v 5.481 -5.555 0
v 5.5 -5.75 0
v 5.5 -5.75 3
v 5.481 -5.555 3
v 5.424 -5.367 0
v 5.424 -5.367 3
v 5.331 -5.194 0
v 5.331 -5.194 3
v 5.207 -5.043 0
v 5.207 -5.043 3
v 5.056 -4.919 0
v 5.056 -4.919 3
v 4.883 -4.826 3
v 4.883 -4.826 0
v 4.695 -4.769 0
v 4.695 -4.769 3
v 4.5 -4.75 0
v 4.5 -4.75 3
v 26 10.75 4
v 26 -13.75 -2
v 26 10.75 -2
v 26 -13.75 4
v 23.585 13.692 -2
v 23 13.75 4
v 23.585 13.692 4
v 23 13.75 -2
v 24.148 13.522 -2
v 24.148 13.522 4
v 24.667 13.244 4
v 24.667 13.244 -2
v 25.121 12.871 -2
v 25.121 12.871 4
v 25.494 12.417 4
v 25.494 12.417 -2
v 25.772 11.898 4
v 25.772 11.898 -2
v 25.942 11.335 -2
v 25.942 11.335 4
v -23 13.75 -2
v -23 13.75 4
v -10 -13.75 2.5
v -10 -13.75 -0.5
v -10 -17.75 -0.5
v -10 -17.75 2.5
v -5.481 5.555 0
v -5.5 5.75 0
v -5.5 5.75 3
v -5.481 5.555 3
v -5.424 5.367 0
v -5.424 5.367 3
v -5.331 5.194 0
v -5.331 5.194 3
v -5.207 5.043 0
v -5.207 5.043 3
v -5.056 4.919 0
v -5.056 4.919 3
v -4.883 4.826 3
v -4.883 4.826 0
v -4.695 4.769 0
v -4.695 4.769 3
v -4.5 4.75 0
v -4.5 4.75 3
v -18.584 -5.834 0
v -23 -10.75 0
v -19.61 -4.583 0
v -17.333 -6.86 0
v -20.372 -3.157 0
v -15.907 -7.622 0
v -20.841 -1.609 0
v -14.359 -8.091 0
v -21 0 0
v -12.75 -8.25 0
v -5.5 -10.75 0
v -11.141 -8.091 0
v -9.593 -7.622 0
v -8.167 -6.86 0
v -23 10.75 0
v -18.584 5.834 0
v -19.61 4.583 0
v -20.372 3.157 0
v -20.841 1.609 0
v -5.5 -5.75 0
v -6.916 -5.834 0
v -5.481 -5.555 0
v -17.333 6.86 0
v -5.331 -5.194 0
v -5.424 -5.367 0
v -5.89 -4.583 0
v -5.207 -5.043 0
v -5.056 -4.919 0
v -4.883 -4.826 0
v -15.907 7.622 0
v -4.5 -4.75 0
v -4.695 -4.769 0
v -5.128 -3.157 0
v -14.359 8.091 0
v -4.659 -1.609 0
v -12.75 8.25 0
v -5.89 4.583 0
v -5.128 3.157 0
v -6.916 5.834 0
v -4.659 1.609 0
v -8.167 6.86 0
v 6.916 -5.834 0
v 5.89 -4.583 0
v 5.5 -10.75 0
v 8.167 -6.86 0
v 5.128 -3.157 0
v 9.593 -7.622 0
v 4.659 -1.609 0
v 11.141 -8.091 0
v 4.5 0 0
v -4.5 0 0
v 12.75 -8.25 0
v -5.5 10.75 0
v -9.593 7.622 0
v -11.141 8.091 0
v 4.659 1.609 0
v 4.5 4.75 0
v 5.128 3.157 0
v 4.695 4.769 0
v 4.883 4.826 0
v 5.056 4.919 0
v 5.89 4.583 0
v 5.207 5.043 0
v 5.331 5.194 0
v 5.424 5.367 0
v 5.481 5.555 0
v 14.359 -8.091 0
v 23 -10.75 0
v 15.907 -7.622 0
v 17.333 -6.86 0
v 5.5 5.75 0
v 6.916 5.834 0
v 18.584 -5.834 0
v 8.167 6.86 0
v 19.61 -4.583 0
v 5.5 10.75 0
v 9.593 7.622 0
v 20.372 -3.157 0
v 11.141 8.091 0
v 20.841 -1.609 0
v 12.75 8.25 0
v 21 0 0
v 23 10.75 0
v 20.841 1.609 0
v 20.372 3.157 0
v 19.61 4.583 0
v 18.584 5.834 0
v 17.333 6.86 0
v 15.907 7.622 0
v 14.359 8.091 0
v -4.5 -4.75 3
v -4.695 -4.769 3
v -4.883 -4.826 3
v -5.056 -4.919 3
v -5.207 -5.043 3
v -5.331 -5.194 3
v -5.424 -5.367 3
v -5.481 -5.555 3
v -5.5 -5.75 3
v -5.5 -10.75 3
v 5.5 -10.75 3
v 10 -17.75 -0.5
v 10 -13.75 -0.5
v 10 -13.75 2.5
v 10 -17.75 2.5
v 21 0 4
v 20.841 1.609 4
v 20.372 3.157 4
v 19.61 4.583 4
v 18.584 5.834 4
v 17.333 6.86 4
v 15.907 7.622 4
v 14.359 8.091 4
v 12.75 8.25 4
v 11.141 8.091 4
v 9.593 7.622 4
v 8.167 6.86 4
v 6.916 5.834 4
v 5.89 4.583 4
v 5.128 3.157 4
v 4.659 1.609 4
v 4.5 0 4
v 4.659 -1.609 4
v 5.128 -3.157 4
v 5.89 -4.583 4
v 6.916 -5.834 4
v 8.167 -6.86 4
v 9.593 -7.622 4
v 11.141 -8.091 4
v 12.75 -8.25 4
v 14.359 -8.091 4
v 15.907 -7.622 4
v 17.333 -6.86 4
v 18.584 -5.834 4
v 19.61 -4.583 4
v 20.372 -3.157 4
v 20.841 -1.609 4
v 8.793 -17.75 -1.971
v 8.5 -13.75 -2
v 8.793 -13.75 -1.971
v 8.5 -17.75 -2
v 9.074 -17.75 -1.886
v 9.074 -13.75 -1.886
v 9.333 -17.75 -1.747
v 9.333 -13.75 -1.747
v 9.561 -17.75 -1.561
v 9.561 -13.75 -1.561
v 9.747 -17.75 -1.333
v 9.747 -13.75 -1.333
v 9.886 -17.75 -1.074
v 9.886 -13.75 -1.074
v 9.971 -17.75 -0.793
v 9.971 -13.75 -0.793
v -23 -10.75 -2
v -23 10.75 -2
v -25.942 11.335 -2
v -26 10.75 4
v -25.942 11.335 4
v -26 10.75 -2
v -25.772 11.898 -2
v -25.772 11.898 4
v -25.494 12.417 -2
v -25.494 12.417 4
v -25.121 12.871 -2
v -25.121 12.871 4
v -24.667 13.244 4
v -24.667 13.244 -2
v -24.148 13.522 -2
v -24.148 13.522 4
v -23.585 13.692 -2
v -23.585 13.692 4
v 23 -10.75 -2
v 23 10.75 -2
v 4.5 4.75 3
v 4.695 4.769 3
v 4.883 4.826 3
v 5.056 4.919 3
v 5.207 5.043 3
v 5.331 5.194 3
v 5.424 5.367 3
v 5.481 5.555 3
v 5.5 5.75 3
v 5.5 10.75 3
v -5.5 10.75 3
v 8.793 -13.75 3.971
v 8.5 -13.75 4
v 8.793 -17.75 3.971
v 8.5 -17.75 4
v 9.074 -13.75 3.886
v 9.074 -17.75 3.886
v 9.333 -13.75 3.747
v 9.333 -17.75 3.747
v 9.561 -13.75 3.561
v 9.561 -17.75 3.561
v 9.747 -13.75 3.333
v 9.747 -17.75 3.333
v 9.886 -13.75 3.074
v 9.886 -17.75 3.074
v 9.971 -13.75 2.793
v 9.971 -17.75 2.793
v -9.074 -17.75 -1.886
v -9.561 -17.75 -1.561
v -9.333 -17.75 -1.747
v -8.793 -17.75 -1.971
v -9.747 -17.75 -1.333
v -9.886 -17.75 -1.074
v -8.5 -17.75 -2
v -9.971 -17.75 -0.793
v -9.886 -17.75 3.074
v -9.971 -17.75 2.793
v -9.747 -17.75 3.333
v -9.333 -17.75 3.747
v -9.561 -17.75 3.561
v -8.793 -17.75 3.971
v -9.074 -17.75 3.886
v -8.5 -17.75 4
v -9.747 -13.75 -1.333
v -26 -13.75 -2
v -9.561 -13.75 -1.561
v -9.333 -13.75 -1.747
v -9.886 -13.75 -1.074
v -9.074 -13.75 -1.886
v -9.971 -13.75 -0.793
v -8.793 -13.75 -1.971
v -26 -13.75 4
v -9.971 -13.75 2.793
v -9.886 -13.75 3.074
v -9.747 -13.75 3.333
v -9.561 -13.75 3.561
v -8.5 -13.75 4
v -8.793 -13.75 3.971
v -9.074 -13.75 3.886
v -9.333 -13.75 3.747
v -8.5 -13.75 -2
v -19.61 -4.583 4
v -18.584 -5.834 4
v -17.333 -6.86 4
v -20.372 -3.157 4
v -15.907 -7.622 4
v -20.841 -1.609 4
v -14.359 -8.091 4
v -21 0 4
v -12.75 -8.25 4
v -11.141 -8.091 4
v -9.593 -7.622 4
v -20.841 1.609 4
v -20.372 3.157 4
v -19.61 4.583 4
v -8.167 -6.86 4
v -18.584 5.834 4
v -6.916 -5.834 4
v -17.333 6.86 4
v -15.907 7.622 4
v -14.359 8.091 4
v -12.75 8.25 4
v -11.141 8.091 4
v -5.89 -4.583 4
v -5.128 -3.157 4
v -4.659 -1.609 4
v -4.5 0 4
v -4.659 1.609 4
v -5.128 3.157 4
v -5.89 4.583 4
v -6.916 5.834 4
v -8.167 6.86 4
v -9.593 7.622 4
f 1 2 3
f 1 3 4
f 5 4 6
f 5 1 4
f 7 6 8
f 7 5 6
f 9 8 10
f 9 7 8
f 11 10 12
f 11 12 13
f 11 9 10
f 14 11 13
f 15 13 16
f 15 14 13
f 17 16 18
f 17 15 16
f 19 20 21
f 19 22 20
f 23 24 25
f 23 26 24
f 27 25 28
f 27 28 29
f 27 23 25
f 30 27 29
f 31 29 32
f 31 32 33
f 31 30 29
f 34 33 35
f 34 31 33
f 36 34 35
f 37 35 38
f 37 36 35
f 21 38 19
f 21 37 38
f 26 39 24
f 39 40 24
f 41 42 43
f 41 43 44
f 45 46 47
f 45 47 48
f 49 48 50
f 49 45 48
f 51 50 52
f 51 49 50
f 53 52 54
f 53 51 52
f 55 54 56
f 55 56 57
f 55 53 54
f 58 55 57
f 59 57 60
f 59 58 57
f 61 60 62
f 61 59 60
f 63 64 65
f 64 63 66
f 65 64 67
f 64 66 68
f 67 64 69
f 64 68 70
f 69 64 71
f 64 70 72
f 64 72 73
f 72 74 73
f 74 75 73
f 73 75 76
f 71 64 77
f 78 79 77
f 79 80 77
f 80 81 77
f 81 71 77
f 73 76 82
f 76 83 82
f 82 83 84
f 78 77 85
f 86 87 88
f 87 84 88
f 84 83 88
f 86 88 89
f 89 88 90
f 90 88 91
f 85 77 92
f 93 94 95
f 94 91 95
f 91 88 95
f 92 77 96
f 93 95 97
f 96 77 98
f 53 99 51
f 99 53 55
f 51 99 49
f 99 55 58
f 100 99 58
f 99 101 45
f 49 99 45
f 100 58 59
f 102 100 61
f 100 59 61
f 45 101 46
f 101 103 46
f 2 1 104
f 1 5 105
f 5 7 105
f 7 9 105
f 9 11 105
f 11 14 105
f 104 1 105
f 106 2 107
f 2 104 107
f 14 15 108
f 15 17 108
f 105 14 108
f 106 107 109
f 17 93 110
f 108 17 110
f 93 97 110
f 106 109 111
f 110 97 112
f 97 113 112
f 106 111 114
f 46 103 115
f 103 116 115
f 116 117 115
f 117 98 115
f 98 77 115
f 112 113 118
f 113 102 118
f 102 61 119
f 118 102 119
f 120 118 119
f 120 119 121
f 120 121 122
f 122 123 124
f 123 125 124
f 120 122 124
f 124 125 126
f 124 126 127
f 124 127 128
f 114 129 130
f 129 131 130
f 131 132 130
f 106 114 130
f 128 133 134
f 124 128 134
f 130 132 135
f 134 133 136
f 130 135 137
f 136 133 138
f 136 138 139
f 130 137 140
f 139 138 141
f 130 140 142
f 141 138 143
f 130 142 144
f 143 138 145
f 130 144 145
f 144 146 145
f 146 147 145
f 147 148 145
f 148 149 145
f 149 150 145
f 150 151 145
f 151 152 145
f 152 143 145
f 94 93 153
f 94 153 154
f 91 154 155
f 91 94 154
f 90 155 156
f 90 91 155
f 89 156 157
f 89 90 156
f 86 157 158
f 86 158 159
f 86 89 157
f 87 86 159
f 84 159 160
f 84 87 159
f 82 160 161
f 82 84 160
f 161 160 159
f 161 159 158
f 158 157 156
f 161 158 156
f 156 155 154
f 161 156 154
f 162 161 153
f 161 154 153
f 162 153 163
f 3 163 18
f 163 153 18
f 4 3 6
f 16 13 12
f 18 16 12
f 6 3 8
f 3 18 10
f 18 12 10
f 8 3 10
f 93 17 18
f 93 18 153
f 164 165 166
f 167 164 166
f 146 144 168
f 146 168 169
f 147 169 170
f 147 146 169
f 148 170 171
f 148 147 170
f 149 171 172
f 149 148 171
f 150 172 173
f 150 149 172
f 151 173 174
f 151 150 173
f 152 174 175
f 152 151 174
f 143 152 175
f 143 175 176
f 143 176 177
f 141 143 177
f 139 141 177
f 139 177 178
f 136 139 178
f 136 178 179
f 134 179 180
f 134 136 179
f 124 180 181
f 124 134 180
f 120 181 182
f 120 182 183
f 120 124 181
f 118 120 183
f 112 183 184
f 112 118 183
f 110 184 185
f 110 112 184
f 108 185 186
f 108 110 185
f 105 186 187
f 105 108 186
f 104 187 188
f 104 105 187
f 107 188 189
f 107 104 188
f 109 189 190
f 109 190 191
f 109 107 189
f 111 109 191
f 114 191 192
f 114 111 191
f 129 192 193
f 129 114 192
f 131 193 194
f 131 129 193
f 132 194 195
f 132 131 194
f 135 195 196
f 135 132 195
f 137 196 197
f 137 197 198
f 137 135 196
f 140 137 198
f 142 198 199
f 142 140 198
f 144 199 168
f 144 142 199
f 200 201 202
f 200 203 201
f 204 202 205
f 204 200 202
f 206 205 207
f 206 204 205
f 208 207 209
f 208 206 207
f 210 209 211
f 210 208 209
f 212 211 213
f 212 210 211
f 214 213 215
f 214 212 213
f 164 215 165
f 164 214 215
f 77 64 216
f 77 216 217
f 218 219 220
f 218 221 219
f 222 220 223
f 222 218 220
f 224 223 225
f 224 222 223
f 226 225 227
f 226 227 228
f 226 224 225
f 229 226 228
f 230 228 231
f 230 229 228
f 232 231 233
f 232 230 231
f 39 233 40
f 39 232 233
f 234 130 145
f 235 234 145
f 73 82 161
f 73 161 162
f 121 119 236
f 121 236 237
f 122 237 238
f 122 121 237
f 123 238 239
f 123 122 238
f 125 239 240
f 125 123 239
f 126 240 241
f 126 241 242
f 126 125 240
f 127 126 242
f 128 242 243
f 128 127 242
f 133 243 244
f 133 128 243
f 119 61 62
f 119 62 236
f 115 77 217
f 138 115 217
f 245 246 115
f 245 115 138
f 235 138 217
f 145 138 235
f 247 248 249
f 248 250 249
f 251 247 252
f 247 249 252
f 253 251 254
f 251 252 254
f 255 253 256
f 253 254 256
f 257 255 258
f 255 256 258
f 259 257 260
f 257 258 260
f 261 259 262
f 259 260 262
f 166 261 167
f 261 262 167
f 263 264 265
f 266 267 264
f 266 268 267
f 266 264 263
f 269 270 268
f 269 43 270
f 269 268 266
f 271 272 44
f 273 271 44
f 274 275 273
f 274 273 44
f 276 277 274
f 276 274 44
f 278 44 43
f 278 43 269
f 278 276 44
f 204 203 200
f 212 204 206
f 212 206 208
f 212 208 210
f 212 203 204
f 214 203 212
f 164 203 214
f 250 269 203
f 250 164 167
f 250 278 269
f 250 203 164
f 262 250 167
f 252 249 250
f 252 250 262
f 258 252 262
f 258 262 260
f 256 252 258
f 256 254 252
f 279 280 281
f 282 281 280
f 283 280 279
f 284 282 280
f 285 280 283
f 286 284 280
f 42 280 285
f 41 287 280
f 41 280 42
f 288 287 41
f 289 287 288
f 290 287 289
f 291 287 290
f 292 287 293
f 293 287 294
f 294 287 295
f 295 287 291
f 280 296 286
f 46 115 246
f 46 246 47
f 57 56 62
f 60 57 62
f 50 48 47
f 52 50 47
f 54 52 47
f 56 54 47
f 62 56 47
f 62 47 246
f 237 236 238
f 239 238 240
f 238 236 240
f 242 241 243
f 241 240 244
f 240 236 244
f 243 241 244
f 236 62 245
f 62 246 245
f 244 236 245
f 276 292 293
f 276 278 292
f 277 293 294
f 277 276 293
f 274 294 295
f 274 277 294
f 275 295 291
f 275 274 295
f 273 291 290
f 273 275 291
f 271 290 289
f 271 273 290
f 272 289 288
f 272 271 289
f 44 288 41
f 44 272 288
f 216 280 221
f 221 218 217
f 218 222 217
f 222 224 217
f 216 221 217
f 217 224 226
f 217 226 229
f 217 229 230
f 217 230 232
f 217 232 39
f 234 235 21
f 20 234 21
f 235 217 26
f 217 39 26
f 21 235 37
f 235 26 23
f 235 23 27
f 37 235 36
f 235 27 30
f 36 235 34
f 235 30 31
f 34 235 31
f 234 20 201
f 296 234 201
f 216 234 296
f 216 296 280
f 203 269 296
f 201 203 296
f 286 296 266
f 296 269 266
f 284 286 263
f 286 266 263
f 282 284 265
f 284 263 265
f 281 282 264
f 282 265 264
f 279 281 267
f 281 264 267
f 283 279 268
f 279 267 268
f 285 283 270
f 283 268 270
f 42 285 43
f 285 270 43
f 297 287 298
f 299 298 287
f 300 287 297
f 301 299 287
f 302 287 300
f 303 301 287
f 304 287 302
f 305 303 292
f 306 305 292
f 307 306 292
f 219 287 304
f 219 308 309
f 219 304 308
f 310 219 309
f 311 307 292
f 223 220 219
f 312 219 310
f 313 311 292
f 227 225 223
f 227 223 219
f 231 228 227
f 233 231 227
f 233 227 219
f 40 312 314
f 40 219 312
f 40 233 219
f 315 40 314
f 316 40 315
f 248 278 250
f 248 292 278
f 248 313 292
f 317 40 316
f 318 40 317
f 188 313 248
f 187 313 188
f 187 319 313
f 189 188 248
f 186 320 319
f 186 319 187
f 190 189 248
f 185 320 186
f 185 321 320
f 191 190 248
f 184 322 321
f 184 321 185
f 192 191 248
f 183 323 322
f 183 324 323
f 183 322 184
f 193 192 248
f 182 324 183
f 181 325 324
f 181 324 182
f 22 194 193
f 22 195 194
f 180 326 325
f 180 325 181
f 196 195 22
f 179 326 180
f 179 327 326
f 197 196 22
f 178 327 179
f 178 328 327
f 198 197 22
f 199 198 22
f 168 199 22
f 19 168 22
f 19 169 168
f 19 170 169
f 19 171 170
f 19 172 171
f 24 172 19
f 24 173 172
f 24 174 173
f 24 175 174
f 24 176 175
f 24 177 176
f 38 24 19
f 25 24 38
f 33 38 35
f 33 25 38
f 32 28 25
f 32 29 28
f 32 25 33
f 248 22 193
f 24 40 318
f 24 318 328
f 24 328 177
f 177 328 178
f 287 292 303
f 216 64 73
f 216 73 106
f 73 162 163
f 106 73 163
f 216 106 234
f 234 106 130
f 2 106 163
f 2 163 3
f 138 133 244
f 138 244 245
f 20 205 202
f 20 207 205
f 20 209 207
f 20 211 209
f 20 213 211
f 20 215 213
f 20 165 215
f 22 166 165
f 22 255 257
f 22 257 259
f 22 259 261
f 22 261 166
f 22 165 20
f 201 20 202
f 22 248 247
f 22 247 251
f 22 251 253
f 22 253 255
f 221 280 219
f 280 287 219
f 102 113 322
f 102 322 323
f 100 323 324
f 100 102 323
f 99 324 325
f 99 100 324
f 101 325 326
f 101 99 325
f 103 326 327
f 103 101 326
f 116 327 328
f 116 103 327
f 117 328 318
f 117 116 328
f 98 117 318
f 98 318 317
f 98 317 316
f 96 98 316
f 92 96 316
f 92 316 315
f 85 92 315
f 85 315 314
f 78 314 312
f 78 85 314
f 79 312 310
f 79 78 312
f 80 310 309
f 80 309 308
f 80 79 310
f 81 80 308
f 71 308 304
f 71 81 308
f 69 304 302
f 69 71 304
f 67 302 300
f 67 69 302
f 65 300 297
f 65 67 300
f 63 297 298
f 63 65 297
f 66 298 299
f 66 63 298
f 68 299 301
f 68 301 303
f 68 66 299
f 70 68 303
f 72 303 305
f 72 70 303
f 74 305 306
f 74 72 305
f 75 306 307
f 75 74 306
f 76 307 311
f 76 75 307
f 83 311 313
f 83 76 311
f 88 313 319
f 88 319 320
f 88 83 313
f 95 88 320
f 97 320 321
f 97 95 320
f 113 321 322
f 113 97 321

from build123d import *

# Parameters (mm, degrees)
SKETCH_1_W          = 52
SKETCH_1_H          = 27.5
SKETCH_1_R          = 8.25
EXTRUDE_1_DEPTH     = 4
SKETCH_1_3_W        = 52
SKETCH_1_3_H        = 27.5
EXTRUDE_2_DEPTH     = 2
CUT_EXTRUDE_1_DEPTH = 3
FILLET_1_R          = 3
SKETCH_2_W          = 20
SKETCH_2_H          = 6
EXTRUDE_3_DEPTH     = 4
FILLET_2_R          = 1.5


with BuildPart() as part:
    # Эскиз1 → Бобышка-Вытянуть1 (new body)
    with BuildSketch(Plane.XY):
        Rectangle(SKETCH_1_W, SKETCH_1_H)
        with Locations((-12.75, 0)):
            Circle(SKETCH_1_R, mode=Mode.SUBTRACT)
        with Locations((12.75, 0)):
            Circle(SKETCH_1_R, mode=Mode.SUBTRACT)
    extrude(amount=EXTRUDE_1_DEPTH)

    # Эскиз1<3> → Бобышка-Вытянуть2 (add)
    with BuildSketch(Plane.XY):
        Rectangle(SKETCH_1_3_W, SKETCH_1_3_H)
        Polygon((5.5, -10.75), (-5.5, -10.75), (-23, -10.75), (-23, 10.75), (-5.5, 10.75), (5.5, 10.75), (23, 10.75), (23, -10.75), align=None, mode=Mode.SUBTRACT)
    extrude(amount=-EXTRUDE_2_DEPTH)

    # Эскиз1<4> → Вырез-Вытянуть1 (cut)
    with BuildSketch(Plane.XY):
        with BuildLine():
            Line((-5.5, -5.75), (-5.5, -10.75))
            Line((-5.5, -10.75), (5.5, -10.75))
            Line((5.5, -10.75), (5.5, -5.75))
            ThreePointArc((5.5, -5.75), (5.207106781, -5.042893219), (4.5, -4.75))
            Line((4.5, -4.75), (-4.5, -4.75))
            ThreePointArc((-4.5, -4.75), (-5.207106781, -5.042893219), (-5.5, -5.75))
        make_face()
        with BuildLine():
            Line((5.5, 10.75), (-5.5, 10.75))
            Line((-5.5, 10.75), (-5.5, 5.75))
            ThreePointArc((-5.5, 5.75), (-5.207106781, 5.042893219), (-4.5, 4.75))
            Line((-4.5, 4.75), (4.5, 4.75))
            ThreePointArc((4.5, 4.75), (5.207106781, 5.042893219), (5.5, 5.75))
            Line((5.5, 5.75), (5.5, 10.75))
        make_face()
    extrude(amount=CUT_EXTRUDE_1_DEPTH, mode=Mode.SUBTRACT)

    # Скругление1
    fillet_1_edges = [part.edges().sort_by_distance(p)[0] for p in [
        (-26, 13.75, 1),
        (26, 13.75, 1),
    ]]
    fillet(fillet_1_edges, radius=FILLET_1_R)

    # Эскиз2 → Бобышка-Вытянуть3 (add)
    with BuildSketch(Plane.XZ.offset(13.75)):
        with Locations((0, 1)):
            Rectangle(SKETCH_2_W, SKETCH_2_H)
    extrude(amount=EXTRUDE_3_DEPTH)

    # Скругление2
    fillet_2_edges = [part.edges().sort_by_distance(p)[0] for p in [
        (-10, -15.75, -2),
        (-10, -15.75, 4),
        (10, -15.75, -2),
        (10, -15.75, 4),
    ]]
    fillet(fillet_2_edges, radius=FILLET_2_R)


solid = part.part
